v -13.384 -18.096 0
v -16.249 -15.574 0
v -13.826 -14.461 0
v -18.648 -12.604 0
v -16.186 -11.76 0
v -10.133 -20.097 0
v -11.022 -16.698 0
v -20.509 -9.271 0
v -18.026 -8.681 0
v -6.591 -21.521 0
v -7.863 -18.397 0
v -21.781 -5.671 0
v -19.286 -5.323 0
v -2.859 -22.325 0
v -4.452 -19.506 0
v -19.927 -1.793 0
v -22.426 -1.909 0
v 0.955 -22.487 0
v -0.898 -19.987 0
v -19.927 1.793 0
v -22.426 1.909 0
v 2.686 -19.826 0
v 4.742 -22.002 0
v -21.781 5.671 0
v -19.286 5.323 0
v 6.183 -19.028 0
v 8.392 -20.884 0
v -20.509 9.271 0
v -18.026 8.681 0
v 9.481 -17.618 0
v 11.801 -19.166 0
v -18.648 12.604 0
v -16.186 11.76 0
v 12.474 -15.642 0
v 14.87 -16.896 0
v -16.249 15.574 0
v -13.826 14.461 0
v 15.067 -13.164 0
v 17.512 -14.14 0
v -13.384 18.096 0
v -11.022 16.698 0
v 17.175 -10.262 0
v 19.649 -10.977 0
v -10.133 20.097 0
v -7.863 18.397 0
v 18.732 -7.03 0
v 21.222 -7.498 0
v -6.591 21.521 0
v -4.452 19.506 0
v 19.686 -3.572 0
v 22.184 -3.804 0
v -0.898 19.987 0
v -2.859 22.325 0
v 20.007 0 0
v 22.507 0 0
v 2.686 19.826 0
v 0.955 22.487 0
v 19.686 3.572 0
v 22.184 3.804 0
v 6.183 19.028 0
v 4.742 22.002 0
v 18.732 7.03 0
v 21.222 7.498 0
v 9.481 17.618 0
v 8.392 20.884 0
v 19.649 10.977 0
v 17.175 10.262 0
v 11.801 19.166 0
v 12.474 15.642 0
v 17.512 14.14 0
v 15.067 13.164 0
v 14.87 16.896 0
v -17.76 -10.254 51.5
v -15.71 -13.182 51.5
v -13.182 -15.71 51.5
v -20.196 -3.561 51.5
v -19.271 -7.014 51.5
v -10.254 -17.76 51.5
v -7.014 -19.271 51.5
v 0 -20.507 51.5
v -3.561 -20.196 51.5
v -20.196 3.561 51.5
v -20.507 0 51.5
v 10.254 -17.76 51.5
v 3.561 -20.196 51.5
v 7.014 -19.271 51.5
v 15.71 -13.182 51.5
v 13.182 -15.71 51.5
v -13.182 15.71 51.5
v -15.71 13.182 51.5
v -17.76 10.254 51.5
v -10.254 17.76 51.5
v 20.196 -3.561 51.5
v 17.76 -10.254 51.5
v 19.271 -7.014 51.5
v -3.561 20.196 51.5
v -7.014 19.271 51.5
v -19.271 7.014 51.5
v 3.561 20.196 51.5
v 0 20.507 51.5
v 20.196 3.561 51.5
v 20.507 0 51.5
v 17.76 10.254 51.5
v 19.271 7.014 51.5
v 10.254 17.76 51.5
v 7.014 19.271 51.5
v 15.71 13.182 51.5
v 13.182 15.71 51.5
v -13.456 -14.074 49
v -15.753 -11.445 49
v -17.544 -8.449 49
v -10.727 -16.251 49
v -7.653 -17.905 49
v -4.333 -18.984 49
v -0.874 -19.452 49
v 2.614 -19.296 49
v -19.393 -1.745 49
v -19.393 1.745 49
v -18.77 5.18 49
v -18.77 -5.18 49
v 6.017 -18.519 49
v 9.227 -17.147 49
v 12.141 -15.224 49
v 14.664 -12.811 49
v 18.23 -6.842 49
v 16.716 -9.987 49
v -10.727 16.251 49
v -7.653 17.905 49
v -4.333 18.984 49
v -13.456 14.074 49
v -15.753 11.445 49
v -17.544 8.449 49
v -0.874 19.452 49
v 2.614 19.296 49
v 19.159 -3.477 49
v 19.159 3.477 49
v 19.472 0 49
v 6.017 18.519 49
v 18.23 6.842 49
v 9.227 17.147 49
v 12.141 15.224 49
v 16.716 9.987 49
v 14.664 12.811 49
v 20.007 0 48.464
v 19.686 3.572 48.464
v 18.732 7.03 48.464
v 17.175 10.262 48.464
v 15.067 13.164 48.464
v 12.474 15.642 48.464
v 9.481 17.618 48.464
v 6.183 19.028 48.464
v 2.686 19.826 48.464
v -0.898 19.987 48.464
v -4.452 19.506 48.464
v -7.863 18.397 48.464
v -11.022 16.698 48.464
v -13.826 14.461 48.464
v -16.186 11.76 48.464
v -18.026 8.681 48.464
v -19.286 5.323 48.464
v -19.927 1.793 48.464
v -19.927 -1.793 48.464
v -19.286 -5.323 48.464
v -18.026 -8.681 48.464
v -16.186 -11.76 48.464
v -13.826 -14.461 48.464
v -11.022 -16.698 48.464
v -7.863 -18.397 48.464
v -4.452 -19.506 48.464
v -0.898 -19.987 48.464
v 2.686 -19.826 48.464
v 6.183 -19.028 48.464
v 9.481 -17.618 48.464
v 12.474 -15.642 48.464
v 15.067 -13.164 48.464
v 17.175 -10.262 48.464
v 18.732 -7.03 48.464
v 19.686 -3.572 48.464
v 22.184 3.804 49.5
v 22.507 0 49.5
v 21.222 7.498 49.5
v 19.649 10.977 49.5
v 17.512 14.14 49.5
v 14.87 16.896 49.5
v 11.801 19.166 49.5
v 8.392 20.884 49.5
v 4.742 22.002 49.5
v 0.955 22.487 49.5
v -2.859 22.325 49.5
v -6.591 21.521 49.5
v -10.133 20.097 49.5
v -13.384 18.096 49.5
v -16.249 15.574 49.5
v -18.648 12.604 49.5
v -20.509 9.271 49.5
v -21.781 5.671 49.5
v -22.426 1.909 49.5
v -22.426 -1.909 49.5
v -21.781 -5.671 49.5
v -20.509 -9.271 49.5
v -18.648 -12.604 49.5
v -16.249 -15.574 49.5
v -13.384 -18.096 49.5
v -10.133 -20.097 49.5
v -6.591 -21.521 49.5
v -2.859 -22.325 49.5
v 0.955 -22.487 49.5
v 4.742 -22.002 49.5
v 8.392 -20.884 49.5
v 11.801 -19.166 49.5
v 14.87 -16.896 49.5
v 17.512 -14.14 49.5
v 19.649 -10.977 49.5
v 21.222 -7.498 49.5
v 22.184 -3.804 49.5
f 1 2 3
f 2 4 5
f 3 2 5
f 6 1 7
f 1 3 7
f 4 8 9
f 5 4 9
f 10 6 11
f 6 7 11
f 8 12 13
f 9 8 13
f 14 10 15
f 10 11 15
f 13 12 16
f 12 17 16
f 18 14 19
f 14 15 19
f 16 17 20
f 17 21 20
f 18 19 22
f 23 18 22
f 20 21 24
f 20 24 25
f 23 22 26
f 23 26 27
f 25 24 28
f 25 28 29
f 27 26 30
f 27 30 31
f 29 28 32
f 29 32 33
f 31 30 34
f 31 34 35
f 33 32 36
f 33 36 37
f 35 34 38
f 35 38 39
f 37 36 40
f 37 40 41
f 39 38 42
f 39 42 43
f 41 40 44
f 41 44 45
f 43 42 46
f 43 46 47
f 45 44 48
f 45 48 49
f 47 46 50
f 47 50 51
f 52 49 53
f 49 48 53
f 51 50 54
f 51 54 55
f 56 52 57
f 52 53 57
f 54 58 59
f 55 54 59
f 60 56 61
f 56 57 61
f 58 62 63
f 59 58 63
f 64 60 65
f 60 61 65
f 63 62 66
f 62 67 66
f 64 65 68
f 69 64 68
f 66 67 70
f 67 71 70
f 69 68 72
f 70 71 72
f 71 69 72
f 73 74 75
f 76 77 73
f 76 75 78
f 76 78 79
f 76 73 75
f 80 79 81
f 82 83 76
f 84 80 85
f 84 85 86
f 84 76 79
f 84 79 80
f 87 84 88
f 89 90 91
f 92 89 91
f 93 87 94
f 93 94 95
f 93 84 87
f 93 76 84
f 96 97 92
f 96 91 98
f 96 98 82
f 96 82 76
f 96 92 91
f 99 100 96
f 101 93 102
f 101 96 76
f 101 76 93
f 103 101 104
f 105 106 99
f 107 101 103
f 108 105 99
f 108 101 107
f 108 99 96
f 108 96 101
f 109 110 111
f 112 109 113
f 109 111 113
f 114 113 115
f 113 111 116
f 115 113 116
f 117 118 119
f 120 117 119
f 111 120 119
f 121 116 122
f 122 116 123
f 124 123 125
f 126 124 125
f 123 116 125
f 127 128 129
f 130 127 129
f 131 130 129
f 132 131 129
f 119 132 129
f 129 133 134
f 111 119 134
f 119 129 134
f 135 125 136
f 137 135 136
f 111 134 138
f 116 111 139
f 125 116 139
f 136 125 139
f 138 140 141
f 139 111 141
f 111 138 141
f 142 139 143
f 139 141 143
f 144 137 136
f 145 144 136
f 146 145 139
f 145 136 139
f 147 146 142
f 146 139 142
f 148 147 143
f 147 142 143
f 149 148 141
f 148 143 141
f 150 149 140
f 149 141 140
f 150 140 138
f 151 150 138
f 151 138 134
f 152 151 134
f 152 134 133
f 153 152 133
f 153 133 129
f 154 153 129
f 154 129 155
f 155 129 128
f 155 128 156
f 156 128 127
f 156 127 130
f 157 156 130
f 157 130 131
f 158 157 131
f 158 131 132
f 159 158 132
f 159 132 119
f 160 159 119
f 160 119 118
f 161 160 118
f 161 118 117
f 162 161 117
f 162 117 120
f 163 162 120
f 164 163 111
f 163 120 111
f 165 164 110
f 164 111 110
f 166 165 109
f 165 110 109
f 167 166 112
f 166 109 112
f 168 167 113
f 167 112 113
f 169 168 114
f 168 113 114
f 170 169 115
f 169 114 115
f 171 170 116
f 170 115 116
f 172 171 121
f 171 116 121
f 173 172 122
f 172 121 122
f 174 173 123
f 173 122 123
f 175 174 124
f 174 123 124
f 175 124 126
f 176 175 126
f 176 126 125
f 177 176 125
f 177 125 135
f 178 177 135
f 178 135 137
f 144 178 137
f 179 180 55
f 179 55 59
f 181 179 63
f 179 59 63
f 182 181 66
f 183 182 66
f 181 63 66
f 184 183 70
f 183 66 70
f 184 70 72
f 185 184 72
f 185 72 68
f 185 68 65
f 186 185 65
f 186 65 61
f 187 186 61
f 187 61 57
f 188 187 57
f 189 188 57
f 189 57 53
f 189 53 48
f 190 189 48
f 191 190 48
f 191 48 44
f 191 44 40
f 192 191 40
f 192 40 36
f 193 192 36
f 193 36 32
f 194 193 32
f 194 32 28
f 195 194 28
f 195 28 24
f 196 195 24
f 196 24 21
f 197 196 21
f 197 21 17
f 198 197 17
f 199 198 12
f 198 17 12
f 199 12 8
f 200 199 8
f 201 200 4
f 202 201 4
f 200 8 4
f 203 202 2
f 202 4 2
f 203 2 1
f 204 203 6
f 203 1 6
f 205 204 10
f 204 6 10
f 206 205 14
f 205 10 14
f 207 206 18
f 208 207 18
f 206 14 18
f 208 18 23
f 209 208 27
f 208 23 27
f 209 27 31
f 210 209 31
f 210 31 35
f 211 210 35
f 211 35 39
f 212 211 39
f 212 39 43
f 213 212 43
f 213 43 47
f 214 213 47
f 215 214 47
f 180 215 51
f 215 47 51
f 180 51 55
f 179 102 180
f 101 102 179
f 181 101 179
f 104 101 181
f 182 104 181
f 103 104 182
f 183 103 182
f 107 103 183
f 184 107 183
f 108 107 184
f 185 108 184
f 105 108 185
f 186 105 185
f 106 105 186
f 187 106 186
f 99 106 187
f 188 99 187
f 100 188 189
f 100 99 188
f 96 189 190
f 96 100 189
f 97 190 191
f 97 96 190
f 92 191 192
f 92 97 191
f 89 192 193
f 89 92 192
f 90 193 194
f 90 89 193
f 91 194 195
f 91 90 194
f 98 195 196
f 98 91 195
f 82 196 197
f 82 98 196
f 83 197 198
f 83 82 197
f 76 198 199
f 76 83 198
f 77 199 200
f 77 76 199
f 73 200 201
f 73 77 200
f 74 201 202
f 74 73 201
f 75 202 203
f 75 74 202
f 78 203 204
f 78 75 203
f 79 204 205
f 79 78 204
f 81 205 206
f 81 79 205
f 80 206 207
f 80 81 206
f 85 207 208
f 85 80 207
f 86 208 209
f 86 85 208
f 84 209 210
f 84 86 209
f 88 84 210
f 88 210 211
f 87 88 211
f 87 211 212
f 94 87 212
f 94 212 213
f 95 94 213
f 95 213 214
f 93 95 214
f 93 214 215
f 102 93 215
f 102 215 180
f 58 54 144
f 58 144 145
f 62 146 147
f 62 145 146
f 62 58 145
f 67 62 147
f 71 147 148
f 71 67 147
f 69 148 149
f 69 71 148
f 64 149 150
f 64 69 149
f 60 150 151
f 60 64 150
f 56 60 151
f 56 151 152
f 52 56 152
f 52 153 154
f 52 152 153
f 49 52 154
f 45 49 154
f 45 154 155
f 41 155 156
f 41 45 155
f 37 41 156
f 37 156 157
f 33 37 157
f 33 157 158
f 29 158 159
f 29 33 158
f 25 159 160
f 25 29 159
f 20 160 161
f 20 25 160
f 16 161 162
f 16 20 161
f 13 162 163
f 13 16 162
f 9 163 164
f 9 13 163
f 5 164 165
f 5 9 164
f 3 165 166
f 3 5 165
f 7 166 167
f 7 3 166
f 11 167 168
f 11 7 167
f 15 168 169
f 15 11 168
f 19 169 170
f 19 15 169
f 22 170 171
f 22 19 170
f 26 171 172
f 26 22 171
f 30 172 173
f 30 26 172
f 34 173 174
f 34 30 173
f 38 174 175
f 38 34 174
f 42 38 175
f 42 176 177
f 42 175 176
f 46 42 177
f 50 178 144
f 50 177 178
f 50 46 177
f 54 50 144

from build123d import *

# Parameters (mm, degrees)
F0_R     = 22.5074090386
F1_DEPTH = 49.5
F2_DEPTH = 2
F3_SIZE  = 2
F4_T     = -2.5


with BuildPart() as f1:
    # F0 (on Top) → F1 (new body)
    with BuildSketch(Plane.XY):
        Circle(F0_R)
    extrude(amount=F1_DEPTH)

    # F2 (add): a face of the model
    f2_faces = [f1.faces().sort_by_distance(p)[0] for p in [
        (0, 0, 49.5),
    ]]
    extrude(f2_faces, amount=F2_DEPTH)

    # F3
    f3_edges = [f1.edges().sort_by_distance(p)[0] for p in [
        (-22.507409, 0, 51.5),
    ]]
    chamfer(f3_edges, length=F3_SIZE)

    # F4
    f4_openings = [f1.faces().sort_by_distance(p)[0] for p in [
        (0, 0, 0),
    ]]
    offset(amount=F4_T, openings=f4_openings)


solid = f1.part
